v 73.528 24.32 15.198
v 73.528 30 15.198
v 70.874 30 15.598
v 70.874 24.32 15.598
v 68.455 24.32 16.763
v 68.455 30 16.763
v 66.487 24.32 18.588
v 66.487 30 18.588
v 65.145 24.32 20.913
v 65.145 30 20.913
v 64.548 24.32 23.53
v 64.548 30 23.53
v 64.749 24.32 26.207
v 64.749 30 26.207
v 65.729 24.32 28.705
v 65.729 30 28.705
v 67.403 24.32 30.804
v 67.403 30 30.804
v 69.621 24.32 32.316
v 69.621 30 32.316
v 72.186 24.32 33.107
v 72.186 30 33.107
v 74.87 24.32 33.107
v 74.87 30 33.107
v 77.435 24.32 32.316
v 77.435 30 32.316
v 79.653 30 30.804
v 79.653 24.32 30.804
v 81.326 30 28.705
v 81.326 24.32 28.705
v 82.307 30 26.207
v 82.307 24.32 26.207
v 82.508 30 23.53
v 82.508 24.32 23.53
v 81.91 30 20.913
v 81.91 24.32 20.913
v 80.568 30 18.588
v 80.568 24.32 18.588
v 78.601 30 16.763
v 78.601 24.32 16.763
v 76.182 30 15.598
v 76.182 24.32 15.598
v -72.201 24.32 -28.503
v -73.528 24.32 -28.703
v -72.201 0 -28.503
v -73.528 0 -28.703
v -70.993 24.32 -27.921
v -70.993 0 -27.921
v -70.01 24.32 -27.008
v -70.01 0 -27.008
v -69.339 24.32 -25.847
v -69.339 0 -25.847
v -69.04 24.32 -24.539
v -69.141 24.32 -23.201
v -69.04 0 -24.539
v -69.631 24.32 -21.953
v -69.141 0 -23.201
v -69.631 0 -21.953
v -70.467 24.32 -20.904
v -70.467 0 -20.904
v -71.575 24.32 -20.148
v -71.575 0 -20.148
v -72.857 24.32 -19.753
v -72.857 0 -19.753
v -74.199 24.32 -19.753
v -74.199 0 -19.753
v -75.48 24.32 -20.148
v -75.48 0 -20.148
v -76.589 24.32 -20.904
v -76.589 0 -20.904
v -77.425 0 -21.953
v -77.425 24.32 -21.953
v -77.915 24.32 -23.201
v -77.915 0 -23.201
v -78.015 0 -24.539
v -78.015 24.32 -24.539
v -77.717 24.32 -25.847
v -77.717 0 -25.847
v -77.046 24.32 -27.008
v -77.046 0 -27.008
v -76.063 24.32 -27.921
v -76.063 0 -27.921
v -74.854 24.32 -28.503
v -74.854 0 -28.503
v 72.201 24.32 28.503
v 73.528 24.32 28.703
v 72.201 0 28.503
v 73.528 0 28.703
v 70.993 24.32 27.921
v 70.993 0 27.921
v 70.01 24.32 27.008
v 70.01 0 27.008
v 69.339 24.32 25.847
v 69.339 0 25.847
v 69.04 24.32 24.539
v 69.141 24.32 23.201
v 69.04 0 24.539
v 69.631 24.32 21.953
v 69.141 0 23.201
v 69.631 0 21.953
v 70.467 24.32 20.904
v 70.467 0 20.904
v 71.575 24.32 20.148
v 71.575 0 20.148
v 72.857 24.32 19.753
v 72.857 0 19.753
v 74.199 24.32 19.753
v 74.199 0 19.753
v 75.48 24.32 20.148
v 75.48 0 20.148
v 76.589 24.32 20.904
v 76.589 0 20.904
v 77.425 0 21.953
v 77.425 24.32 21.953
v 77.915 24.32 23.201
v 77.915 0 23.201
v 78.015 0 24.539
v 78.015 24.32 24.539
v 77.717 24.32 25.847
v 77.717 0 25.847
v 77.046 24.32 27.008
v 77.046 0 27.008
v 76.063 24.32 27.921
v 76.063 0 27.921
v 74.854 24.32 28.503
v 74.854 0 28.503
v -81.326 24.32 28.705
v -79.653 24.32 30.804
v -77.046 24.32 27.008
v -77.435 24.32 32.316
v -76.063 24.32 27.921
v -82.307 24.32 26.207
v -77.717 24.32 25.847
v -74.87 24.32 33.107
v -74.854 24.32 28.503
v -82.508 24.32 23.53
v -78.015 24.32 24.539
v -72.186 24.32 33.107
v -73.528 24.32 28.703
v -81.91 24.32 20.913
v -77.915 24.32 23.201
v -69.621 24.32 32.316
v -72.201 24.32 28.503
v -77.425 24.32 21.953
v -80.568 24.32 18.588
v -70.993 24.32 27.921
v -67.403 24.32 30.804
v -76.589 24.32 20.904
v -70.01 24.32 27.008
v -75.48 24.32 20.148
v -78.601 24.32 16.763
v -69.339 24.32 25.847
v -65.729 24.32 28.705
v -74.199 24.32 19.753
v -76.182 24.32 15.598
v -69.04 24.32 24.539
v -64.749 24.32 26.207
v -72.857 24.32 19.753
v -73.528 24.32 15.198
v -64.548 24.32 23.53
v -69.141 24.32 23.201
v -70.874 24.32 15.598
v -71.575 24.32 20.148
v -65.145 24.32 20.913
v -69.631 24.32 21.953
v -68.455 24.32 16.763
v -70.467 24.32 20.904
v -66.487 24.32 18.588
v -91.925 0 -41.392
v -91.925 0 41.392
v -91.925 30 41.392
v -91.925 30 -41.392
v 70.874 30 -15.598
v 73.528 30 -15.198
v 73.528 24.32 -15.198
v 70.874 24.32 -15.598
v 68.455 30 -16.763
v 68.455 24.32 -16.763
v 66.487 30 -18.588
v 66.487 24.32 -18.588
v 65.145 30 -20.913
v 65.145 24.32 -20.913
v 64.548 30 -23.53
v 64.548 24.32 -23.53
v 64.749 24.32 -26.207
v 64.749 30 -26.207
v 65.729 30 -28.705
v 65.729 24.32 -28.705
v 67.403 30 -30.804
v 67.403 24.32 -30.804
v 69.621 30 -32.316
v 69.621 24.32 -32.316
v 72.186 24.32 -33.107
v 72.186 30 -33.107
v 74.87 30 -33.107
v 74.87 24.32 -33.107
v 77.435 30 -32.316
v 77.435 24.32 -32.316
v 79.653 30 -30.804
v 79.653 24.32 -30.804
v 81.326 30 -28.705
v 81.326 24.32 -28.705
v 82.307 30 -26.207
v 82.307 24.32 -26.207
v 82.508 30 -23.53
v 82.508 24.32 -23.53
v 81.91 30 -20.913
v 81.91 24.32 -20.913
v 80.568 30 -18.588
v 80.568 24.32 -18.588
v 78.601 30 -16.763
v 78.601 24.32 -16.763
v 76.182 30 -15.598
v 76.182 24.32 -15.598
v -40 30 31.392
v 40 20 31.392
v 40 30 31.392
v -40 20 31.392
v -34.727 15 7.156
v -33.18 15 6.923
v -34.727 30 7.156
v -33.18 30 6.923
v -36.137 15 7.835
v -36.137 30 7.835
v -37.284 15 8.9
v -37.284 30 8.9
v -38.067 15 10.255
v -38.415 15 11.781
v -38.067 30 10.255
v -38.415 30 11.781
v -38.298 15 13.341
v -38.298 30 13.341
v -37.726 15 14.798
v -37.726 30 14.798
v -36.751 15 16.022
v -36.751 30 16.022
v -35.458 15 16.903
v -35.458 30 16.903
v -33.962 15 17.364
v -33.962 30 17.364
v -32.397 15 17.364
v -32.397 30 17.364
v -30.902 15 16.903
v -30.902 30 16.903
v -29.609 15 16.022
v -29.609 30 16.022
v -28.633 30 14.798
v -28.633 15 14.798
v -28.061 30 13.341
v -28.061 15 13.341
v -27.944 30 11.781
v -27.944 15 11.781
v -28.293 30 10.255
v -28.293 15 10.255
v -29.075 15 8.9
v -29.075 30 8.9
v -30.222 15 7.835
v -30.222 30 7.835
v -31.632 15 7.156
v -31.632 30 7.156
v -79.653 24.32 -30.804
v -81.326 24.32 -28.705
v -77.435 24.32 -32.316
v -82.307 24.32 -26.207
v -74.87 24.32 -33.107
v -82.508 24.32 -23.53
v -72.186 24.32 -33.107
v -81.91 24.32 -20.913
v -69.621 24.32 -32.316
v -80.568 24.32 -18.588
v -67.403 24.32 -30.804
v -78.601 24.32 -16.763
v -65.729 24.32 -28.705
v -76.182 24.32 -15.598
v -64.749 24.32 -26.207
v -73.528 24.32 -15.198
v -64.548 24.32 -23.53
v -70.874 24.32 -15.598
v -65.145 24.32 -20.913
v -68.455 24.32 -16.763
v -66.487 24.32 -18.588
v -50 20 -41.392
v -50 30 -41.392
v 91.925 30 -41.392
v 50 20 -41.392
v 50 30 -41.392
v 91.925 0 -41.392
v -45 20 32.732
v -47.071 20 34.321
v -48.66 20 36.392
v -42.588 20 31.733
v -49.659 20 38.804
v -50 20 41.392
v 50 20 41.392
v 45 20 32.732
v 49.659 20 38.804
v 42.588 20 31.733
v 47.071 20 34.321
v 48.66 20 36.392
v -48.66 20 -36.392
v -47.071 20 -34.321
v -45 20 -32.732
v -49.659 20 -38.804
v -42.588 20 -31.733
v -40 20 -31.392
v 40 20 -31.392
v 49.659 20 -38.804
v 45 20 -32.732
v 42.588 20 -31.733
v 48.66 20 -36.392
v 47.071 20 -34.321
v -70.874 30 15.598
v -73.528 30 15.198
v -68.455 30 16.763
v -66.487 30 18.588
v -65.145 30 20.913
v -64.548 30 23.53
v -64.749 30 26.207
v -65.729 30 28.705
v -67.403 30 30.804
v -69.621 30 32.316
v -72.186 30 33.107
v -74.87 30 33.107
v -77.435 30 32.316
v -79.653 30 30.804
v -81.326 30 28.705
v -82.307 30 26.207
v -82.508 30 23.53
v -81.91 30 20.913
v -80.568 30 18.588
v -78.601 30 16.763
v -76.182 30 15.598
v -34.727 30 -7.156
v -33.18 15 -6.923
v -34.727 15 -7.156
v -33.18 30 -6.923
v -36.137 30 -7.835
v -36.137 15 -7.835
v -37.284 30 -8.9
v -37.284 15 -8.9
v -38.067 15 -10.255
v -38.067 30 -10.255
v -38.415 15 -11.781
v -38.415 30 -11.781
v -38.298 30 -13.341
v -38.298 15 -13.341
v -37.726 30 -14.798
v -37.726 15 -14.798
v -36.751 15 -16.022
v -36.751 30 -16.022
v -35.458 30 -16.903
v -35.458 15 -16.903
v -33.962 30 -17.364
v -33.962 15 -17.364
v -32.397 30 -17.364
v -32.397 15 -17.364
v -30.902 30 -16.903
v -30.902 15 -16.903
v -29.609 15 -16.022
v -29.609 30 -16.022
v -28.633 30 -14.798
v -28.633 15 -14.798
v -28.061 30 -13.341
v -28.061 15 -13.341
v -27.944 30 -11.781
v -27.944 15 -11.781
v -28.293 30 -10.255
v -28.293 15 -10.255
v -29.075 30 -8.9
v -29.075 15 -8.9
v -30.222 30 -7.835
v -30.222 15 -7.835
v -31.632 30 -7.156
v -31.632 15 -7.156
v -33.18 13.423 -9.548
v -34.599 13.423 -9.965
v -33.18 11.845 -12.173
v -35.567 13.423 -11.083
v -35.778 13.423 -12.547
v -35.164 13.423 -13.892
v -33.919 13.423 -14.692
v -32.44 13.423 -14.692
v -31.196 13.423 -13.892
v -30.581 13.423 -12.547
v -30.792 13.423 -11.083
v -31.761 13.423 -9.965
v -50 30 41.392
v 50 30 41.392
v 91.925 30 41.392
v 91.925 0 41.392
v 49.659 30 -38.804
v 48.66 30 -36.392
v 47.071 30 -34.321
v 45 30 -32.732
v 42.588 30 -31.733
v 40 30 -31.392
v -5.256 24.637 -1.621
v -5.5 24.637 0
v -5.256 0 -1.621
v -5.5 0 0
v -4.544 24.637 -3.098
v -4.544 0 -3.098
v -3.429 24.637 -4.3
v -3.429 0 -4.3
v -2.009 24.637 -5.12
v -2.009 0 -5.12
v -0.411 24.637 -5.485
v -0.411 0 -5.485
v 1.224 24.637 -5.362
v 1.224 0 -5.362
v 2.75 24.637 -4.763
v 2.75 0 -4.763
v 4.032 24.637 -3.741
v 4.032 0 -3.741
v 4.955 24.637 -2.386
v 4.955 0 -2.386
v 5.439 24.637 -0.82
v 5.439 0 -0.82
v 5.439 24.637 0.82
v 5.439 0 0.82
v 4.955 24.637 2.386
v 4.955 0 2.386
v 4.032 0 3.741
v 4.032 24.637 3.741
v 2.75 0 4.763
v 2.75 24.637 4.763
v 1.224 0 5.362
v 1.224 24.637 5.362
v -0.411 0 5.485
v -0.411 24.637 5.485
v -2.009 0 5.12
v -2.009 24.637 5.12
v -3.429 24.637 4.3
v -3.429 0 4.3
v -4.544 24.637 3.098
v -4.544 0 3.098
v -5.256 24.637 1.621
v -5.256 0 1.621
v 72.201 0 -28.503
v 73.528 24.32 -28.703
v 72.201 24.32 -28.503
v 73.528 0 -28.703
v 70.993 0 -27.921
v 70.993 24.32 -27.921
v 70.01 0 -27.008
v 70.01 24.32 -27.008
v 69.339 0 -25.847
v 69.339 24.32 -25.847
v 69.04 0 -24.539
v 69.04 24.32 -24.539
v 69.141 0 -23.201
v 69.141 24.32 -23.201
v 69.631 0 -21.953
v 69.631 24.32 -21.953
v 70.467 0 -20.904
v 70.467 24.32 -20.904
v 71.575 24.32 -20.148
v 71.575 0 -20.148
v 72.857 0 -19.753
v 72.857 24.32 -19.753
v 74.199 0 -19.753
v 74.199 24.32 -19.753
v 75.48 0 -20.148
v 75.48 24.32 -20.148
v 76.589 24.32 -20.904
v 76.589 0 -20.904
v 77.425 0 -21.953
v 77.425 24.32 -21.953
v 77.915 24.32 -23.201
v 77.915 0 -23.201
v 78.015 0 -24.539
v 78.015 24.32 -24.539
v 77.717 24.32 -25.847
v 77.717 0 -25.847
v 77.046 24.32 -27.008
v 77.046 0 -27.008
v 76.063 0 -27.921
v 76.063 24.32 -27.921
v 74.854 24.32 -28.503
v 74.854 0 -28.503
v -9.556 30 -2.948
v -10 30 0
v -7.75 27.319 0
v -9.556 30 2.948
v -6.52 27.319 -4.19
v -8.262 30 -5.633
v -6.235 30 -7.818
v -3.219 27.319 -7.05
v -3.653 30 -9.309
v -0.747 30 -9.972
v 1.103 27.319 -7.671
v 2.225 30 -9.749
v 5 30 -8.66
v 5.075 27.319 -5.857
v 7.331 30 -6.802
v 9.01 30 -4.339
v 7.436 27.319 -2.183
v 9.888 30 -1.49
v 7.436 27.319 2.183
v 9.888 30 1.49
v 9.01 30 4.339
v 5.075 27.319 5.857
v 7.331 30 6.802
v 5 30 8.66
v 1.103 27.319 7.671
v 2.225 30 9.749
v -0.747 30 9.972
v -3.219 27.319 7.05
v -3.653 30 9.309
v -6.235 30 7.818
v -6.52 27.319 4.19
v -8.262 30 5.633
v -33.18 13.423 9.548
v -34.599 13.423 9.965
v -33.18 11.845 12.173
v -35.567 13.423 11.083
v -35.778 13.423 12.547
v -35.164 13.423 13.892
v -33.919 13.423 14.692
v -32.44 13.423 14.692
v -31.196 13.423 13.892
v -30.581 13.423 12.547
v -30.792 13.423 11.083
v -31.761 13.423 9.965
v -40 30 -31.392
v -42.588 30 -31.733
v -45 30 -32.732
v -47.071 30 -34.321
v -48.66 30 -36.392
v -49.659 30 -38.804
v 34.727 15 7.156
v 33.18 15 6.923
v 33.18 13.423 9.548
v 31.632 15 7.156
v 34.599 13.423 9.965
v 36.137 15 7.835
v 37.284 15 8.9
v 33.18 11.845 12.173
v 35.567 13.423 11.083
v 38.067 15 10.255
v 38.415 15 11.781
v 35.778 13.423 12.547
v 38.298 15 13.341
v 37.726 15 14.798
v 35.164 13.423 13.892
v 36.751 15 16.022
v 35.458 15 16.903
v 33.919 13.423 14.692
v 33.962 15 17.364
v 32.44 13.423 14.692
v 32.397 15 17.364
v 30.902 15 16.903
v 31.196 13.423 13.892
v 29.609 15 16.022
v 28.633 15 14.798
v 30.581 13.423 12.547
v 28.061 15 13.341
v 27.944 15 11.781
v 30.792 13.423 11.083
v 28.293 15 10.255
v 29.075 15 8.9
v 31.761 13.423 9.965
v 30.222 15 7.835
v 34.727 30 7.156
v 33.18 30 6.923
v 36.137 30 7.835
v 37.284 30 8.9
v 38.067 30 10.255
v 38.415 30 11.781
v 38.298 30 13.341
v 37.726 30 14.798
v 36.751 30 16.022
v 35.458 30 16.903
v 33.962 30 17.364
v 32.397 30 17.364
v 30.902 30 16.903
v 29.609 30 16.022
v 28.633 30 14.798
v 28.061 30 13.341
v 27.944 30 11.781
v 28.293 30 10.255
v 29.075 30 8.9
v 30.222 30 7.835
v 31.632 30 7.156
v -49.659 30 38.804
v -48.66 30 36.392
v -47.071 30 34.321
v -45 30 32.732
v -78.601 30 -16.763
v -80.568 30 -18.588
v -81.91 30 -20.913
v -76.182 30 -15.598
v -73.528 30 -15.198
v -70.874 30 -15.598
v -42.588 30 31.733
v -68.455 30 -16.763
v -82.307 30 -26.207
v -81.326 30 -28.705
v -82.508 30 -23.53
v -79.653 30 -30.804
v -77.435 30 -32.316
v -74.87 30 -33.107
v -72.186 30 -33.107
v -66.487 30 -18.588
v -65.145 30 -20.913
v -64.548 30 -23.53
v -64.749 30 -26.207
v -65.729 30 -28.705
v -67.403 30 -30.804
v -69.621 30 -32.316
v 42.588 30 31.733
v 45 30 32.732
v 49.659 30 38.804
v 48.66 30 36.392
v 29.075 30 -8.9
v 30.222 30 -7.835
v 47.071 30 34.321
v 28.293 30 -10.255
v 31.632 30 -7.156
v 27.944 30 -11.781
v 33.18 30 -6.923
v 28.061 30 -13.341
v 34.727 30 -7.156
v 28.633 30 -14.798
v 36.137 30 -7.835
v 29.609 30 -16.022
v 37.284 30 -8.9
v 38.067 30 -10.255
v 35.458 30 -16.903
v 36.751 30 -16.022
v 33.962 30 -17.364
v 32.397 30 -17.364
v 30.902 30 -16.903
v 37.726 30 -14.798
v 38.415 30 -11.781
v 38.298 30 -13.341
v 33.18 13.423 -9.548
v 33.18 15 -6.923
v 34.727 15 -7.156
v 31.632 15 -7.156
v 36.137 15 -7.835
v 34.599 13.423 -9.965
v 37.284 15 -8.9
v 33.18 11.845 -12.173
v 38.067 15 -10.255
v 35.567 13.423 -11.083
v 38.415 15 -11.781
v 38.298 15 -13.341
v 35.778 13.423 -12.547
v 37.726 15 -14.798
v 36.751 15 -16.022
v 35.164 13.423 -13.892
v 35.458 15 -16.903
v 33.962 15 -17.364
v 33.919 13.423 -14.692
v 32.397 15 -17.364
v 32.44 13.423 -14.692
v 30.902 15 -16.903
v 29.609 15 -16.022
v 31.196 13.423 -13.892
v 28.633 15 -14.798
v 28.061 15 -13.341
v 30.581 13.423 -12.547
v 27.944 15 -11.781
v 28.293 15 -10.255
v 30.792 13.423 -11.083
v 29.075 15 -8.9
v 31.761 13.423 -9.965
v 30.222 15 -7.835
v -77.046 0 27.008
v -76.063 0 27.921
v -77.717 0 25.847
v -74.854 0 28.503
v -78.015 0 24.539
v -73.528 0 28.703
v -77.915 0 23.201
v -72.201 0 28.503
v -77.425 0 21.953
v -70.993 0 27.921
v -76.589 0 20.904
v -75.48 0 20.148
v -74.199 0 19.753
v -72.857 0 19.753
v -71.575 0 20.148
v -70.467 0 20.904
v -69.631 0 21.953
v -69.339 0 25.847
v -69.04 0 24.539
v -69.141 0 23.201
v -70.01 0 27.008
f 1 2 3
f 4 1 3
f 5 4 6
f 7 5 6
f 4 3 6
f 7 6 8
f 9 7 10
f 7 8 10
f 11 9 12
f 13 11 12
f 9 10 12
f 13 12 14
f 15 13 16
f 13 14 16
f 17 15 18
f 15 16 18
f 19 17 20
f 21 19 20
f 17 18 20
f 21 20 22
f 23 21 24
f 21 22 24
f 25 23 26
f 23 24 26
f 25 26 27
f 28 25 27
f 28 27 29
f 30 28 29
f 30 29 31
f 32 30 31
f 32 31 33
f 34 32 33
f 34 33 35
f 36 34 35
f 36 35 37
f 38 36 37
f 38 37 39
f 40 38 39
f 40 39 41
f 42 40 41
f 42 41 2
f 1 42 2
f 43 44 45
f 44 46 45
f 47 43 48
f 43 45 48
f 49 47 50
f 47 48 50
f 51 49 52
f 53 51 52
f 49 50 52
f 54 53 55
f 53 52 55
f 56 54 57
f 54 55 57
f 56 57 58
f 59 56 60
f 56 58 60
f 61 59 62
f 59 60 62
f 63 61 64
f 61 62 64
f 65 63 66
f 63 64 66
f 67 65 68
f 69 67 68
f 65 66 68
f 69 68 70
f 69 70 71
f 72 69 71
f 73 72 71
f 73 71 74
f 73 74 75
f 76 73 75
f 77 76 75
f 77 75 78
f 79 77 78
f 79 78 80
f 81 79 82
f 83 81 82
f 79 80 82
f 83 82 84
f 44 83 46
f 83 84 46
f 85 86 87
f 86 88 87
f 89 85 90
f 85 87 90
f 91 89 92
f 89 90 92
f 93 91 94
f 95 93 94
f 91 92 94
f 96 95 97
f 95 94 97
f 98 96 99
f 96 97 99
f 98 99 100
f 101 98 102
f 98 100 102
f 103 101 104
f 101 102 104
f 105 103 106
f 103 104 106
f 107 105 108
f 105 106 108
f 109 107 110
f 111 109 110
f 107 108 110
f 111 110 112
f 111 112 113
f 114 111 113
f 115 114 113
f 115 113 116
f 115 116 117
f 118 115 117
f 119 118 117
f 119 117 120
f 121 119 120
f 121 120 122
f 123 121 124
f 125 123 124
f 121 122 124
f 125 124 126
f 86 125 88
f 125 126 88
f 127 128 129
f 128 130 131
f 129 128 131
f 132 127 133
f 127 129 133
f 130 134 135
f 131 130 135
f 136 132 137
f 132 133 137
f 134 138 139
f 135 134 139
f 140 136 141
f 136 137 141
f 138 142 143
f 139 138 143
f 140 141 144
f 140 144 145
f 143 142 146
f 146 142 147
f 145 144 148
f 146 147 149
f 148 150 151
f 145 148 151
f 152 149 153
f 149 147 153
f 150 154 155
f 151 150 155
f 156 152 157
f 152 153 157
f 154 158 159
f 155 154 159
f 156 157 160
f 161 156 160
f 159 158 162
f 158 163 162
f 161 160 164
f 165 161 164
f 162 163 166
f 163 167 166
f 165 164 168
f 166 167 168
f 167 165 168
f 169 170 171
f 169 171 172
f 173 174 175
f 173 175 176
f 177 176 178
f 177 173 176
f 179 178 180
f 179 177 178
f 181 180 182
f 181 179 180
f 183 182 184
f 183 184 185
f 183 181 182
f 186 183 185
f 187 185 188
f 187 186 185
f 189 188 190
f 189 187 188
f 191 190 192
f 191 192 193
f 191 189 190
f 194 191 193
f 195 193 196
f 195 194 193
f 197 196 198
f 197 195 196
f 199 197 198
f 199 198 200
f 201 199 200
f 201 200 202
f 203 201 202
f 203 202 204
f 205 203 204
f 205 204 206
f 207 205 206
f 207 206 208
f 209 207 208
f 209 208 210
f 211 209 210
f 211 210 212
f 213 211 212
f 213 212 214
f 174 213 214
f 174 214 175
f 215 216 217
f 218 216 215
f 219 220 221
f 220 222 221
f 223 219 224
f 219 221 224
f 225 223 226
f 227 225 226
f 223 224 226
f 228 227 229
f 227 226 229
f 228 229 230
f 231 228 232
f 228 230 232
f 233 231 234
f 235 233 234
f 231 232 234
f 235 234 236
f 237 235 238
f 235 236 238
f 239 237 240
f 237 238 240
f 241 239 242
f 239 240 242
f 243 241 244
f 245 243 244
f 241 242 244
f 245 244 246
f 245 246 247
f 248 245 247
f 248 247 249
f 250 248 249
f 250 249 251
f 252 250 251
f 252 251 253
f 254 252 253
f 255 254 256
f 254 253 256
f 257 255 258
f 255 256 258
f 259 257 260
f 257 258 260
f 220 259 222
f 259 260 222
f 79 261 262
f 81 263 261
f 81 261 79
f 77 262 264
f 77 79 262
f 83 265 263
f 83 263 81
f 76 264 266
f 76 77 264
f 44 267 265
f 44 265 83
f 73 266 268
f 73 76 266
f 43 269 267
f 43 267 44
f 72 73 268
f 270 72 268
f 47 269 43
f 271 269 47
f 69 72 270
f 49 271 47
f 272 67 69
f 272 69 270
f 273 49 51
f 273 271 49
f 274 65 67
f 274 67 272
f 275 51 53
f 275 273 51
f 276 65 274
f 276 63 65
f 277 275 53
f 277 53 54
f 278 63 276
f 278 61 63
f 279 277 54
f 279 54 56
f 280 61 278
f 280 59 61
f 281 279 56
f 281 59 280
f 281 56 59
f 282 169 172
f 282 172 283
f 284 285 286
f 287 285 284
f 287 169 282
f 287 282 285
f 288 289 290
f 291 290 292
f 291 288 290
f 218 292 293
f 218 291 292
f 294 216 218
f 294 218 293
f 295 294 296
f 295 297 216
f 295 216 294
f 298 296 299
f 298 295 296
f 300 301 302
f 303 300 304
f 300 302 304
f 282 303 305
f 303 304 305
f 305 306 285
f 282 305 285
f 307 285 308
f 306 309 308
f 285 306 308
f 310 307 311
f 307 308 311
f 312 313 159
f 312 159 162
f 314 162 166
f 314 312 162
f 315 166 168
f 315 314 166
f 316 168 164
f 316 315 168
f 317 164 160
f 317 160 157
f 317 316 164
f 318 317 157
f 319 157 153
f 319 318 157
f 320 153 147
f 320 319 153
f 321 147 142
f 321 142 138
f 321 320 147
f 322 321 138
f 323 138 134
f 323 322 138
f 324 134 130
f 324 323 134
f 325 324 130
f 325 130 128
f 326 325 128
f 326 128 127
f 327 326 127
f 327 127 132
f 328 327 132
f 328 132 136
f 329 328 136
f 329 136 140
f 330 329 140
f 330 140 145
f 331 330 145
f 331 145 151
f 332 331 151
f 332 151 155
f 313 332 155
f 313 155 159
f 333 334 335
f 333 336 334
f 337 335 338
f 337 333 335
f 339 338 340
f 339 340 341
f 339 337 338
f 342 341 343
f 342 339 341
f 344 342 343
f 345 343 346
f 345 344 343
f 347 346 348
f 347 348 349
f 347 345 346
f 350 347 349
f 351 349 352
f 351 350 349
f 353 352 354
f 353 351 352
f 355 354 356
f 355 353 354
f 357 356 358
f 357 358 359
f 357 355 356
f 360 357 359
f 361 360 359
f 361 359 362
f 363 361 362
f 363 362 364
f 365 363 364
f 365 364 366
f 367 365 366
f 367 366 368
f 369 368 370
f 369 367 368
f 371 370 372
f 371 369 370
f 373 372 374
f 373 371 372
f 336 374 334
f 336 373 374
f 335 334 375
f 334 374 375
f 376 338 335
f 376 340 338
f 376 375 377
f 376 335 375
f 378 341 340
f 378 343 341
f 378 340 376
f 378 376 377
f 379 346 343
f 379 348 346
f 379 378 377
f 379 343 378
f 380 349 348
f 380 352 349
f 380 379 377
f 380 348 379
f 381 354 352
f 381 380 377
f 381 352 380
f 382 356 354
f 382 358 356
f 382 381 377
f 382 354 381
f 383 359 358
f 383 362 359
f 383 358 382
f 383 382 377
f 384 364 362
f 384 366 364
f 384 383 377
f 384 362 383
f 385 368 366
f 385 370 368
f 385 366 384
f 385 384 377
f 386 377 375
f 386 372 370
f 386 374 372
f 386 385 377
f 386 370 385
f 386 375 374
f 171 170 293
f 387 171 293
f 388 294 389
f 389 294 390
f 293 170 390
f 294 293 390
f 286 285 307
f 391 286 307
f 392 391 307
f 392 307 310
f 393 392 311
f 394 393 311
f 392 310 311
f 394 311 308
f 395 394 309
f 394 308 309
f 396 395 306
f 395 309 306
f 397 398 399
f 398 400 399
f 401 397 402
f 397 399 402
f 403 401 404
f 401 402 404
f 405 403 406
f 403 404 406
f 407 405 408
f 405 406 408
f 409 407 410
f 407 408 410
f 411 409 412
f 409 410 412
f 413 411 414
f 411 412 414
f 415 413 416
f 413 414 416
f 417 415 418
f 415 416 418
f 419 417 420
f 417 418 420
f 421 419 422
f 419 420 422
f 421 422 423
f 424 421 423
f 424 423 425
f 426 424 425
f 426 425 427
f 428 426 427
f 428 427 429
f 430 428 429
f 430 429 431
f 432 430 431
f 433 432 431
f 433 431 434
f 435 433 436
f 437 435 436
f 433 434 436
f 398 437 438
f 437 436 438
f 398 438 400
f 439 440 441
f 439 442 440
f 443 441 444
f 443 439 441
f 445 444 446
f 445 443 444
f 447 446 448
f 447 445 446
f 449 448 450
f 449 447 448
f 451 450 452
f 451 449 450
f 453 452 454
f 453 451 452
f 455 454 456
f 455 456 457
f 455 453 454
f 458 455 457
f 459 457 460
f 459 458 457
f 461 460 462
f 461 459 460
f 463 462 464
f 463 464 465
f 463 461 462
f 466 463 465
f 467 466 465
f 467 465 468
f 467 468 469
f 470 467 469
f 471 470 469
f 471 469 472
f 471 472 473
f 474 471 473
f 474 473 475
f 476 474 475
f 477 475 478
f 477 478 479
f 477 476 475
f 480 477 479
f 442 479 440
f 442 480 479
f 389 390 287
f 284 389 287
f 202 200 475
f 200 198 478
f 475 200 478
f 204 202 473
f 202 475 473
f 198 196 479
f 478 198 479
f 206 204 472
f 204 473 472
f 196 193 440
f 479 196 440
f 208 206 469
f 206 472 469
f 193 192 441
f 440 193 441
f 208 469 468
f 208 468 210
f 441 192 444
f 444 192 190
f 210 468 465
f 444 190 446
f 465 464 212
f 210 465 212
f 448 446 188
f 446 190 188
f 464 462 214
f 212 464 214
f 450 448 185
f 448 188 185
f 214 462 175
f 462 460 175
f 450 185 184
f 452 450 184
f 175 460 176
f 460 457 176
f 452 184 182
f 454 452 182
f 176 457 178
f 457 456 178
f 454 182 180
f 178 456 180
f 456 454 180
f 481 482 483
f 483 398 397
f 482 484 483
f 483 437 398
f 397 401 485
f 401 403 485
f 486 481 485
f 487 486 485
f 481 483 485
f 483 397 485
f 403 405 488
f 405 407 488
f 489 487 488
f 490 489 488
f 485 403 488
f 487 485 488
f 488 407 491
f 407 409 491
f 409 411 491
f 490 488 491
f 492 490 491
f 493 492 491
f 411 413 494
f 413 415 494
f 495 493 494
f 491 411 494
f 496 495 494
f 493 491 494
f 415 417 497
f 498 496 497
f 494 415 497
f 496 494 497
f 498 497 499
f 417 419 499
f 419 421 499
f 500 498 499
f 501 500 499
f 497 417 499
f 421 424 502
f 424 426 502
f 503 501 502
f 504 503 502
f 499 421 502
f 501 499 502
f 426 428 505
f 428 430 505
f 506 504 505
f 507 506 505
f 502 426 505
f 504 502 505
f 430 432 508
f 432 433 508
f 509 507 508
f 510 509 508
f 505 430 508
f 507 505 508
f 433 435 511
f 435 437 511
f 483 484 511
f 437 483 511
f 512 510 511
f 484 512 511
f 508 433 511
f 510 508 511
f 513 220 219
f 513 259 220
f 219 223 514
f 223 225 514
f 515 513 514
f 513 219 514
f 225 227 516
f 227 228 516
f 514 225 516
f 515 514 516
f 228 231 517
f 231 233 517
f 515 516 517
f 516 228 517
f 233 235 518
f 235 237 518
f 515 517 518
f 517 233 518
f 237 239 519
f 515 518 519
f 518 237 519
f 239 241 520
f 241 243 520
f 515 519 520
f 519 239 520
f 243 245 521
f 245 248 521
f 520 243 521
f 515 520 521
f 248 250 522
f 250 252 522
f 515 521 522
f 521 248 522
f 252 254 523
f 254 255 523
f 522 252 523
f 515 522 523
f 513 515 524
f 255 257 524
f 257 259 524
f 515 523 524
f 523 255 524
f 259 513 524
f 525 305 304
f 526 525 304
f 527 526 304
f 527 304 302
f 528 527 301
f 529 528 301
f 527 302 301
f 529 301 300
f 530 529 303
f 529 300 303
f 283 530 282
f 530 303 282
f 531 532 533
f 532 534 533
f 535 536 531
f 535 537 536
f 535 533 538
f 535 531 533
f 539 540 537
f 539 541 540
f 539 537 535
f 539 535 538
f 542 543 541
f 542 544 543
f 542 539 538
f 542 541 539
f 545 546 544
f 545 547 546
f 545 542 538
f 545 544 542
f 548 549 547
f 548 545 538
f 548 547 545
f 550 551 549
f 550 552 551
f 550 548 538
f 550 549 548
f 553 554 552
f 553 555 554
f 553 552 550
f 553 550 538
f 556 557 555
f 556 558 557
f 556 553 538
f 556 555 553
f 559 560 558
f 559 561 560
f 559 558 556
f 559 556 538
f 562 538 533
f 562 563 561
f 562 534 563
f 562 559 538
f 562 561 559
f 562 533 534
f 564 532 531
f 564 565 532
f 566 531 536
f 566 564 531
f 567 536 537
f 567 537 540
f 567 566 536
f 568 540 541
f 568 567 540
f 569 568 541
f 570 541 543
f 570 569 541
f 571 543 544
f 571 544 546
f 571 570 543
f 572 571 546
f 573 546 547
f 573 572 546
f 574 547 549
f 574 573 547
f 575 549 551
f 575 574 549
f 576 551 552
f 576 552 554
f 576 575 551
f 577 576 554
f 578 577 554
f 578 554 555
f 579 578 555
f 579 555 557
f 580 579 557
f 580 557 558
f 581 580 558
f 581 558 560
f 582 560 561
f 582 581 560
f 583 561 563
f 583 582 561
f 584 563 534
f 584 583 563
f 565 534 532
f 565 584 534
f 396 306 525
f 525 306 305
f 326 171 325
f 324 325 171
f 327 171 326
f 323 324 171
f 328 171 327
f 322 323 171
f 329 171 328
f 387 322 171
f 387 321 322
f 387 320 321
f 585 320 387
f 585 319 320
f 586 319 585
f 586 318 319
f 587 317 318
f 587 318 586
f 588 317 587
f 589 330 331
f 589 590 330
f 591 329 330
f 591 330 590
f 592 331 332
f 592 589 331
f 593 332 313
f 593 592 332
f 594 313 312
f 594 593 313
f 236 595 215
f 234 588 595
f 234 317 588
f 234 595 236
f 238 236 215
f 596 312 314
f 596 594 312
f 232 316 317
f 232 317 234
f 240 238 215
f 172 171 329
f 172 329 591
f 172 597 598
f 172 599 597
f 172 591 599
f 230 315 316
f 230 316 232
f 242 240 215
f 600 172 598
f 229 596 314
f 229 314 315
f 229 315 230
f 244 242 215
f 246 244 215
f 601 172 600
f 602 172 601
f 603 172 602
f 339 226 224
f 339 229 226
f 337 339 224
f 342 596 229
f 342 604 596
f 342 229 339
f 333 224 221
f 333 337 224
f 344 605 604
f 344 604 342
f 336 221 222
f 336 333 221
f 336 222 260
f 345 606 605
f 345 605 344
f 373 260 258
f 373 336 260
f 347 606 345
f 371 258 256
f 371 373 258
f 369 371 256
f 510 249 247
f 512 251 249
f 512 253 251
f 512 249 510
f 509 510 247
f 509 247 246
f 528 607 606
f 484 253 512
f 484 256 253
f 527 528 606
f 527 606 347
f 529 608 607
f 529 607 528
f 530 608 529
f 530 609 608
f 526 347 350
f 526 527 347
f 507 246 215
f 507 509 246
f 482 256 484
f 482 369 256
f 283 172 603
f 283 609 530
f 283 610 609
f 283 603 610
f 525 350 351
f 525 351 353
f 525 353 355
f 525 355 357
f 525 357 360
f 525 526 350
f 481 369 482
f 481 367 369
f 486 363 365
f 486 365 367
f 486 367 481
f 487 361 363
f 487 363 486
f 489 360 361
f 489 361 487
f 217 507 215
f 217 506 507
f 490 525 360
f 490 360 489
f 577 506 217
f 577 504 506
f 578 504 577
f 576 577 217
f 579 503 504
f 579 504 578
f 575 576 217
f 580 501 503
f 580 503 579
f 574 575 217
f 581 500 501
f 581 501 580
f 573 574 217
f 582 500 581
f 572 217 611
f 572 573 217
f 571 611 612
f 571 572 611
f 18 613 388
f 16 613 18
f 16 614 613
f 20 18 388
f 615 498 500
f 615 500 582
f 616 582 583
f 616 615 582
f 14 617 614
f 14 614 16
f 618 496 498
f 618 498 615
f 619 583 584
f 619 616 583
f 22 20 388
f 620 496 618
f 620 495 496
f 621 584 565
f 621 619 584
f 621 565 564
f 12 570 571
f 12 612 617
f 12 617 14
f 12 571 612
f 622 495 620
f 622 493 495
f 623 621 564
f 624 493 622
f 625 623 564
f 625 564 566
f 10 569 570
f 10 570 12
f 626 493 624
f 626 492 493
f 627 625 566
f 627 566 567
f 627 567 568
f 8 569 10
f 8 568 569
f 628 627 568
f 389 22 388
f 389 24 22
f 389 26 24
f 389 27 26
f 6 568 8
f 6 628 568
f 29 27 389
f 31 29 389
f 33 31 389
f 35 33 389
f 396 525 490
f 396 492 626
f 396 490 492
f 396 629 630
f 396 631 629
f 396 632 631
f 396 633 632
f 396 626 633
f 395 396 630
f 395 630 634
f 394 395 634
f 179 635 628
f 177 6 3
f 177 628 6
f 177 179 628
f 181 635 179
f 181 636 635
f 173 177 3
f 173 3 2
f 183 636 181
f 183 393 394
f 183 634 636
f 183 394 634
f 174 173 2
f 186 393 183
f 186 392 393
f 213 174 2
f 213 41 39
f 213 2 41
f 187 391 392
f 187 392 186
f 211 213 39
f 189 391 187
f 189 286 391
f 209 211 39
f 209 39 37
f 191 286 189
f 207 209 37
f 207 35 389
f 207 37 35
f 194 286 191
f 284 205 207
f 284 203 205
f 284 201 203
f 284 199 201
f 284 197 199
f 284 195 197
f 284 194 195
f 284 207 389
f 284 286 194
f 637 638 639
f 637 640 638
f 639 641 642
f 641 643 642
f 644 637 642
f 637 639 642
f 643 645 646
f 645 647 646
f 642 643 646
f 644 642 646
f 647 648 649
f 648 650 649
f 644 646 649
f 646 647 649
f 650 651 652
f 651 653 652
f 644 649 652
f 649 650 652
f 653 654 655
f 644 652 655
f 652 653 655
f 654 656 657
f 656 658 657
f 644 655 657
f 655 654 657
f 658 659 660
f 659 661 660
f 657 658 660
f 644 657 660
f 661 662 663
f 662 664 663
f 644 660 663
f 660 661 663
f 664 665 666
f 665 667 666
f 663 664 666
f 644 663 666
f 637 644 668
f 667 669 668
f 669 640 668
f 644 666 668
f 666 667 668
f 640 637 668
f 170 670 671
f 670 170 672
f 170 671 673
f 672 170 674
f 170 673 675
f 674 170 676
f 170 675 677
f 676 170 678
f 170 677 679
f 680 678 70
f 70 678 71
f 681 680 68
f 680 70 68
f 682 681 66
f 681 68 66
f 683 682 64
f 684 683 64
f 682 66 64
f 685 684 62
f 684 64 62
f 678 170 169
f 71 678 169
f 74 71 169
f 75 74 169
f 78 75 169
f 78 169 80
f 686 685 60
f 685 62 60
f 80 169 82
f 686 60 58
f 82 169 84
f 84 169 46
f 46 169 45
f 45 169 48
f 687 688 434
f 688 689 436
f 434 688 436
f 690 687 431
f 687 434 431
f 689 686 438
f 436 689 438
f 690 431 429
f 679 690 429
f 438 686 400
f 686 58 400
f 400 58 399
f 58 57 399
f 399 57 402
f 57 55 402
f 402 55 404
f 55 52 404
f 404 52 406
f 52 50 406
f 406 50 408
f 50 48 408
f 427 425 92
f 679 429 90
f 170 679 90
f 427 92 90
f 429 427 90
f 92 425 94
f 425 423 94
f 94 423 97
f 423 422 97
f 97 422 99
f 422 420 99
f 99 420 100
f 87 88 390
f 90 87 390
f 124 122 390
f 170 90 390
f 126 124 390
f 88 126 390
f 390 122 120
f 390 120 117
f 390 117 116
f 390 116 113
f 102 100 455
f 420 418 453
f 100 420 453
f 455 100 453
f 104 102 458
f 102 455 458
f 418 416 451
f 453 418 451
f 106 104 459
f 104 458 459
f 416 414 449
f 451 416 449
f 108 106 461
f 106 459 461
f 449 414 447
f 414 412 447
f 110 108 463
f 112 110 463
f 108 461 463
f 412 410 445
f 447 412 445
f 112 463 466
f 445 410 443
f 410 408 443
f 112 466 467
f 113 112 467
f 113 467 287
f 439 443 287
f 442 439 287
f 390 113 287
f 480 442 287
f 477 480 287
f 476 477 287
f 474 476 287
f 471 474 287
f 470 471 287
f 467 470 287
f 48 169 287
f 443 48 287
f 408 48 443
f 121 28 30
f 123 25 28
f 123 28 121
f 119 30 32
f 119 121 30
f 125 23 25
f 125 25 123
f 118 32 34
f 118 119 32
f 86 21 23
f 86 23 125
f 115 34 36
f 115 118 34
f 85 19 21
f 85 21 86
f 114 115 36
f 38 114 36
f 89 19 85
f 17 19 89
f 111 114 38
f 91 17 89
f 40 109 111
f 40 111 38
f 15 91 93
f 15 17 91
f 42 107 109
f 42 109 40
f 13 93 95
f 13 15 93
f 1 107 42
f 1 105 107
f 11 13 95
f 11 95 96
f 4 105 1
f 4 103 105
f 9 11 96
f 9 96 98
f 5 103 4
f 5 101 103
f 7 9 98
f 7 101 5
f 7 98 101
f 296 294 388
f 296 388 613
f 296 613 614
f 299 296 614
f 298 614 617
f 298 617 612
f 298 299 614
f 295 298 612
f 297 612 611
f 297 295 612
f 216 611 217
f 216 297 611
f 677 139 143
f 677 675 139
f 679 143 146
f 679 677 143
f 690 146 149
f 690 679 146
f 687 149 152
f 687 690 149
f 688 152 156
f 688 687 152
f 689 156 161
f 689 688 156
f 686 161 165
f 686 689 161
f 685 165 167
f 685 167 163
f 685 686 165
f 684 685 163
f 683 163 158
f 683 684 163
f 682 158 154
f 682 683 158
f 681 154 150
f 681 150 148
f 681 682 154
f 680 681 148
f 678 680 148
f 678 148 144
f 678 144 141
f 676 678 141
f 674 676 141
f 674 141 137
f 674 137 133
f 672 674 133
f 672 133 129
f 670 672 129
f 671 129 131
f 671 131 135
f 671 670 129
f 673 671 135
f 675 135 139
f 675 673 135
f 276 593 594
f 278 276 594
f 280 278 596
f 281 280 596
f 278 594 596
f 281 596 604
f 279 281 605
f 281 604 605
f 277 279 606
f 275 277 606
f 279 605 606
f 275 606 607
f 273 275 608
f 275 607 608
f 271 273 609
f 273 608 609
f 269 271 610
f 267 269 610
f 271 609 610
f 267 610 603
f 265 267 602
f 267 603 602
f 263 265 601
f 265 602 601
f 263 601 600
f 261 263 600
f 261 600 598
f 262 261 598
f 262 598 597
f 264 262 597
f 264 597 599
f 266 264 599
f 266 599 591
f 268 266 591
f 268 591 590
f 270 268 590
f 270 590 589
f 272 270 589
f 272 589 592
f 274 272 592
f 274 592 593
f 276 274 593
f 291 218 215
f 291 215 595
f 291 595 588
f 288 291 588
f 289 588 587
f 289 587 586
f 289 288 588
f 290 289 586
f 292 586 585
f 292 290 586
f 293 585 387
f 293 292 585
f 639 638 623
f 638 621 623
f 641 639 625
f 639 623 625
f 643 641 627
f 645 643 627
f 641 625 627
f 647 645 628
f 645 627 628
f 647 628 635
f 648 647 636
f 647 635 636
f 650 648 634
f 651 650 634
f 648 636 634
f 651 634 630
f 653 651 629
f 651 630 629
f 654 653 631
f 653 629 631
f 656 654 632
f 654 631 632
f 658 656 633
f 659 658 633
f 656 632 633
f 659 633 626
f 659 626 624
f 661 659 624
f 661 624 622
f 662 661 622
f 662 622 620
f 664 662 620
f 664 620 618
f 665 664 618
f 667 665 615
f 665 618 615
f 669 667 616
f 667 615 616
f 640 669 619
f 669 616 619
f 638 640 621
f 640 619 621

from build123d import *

# Parameters (mm, degrees)
SKETCH1_W                                        = 183.850004878
SKETCH1_H                                        = 82.78473231
BOSS_EXTRUDE1_DEPTH                              = 30
CSK_FOR_M10_FLAT_HEAD_MACHINE_SCREW2_D           = 11
CSK_FOR_M10_FLAT_HEAD_MACHINE_SCREW2_CSINK_D     = 20
CSK_FOR_M10_FLAT_HEAD_MACHINE_SCREW2_CSINK_ANGLE = 80
CBORE_FOR_M8_HEX_HEAD_BOLT1_D                    = 9
CBORE_FOR_M8_HEX_HEAD_BOLT1_CBORE_D              = 18.01
CBORE_FOR_M8_HEX_HEAD_BOLT1_CBORE_DEPTH          = 5.68
MIRROR2_COPY_1_D                                 = 9
MIRROR2_COPY_1_CBORE_D                           = 18.01
MIRROR2_COPY_1_CBORE_DEPTH                       = 5.68
F_20_0MM_START                                   = 20
F_20_0MM_DOWEL_SLOT1_DEPTH                       = 10


# Read off the part's stored shape, not the designer's step: Ø20.0mm Dowel Slot1
with BuildPart() as part:
    # Sketch1 → Boss-Extrude1 (new body)
    with BuildSketch(Plane(origin=(0, 0, 0), x_dir=(1, 0, 0), z_dir=(0, 1, 0))):
        Rectangle(SKETCH1_W, SKETCH1_H)
    extrude(amount=BOSS_EXTRUDE1_DEPTH)

    # CSK for M10 Flat Head Machine Screw2 (through all)
    with Locations(Plane(origin=(0, 30, 0), x_dir=(1, 0, 0), z_dir=(0, 1, 0))):
        with Locations((0, 0)):
            CounterSinkHole(CSK_FOR_M10_FLAT_HEAD_MACHINE_SCREW2_D / 2, CSK_FOR_M10_FLAT_HEAD_MACHINE_SCREW2_CSINK_D / 2, counter_sink_angle=CSK_FOR_M10_FLAT_HEAD_MACHINE_SCREW2_CSINK_ANGLE)

    # CBORE for M8 Hex Head Bolt1 (through all)
    with Locations(Plane(origin=(-73.52781125, 30, -24.202787729), x_dir=(0, 0, 1), z_dir=(0, 1, 0))):
        with Locations((0, 0)):
            cbore_for_m8_hex_head_bolt1 = CounterBoreHole(CBORE_FOR_M8_HEX_HEAD_BOLT1_D / 2, CBORE_FOR_M8_HEX_HEAD_BOLT1_CBORE_D / 2, CBORE_FOR_M8_HEX_HEAD_BOLT1_CBORE_DEPTH)

    # Mirror1: CBORE for M8 Hex Head Bolt1 across plane
    add(cbore_for_m8_hex_head_bolt1.mirror(Plane.XY), mode=Mode.SUBTRACT)

    # Mirror2: CBORE for M8 Hex Head Bolt1 across plane
    add(cbore_for_m8_hex_head_bolt1.mirror(Plane(origin=(0, 0, 0), x_dir=(0, 0, 1), z_dir=(1, 0, 0))), mode=Mode.SUBTRACT)

    # Mirror2 copy 1 (through all)
    with Locations(Plane(origin=(73.52781125, 30, 24.202787729), x_dir=(0, 0, -1), z_dir=(0, 1, 0))):
        with Locations((0, 0)):
            CounterBoreHole(MIRROR2_COPY_1_D / 2, MIRROR2_COPY_1_CBORE_D / 2, MIRROR2_COPY_1_CBORE_DEPTH)

    # Ø20.0mm Dowel Slot1 outline → Ø20.0mm Dowel Slot1 (cut)
    with BuildSketch(Plane(origin=(0, 0, 0), x_dir=(1, 0, 0), z_dir=(0, 1, 0)).offset(F_20_0MM_START)):
        with BuildLine():
            Line((-50, -41.392366155), (50, -41.392366155))
            ThreePointArc((50, -41.392366155), (47.071067812, -34.321298343), (40, -31.392366155))
            Line((40, -31.392366155), (-40, -31.392366155))
            ThreePointArc((-40, -31.392366155), (-47.071067812, -34.321298343), (-50, -41.392366155))
        make_face()
    f_20_0mm_dowel_slot1 = extrude(amount=F_20_0MM_DOWEL_SLOT1_DEPTH, mode=Mode.SUBTRACT)

    # Mirror3: Ø20.0mm Dowel Slot1 across plane
    add(f_20_0mm_dowel_slot1.mirror(Plane.XY), mode=Mode.SUBTRACT)

    # Sketch20 → M12x1.5 Tapped Hole1 (revolve, cut)
    with BuildSketch(Plane(origin=(-33.179705033, 30, -12.1730736), x_dir=(0, 0, 1), z_dir=(1, 0, 0))):
        Polygon((0, 0), (0, 18.15451825), (5.25, 15), (5.25, 0), align=None)
    m12x1_5_tapped_hole1 = revolve(axis=Axis((-33.179705033, 36.35, -12.1730736), (0, -1, 0)), mode=Mode.SUBTRACT)

    # Mirror4: M12x1.5 Tapped Hole1 across plane
    add(m12x1_5_tapped_hole1.mirror(Plane.XY), mode=Mode.SUBTRACT)

    # Mirror5: M12x1.5 Tapped Hole1 across plane
    add(m12x1_5_tapped_hole1.mirror(Plane(origin=(0, 0, 0), x_dir=(0, 0, 1), z_dir=(1, 0, 0))), mode=Mode.SUBTRACT)

    # Mirror5 copy 1 sketch → Mirror5 copy 1 (revolve, cut)
    with BuildSketch(Plane(origin=(33.179705033, 30, 12.1730736), x_dir=(0, 0, -1), z_dir=(-1, 0, 0))):
        Polygon((0, 0), (0, 18.15451825), (5.25, 15), (5.25, 0), align=None)
    revolve(axis=Axis((33.179705033, 36.35, 12.1730736), (0, -1, 0)), mode=Mode.SUBTRACT)


solid = part.part
